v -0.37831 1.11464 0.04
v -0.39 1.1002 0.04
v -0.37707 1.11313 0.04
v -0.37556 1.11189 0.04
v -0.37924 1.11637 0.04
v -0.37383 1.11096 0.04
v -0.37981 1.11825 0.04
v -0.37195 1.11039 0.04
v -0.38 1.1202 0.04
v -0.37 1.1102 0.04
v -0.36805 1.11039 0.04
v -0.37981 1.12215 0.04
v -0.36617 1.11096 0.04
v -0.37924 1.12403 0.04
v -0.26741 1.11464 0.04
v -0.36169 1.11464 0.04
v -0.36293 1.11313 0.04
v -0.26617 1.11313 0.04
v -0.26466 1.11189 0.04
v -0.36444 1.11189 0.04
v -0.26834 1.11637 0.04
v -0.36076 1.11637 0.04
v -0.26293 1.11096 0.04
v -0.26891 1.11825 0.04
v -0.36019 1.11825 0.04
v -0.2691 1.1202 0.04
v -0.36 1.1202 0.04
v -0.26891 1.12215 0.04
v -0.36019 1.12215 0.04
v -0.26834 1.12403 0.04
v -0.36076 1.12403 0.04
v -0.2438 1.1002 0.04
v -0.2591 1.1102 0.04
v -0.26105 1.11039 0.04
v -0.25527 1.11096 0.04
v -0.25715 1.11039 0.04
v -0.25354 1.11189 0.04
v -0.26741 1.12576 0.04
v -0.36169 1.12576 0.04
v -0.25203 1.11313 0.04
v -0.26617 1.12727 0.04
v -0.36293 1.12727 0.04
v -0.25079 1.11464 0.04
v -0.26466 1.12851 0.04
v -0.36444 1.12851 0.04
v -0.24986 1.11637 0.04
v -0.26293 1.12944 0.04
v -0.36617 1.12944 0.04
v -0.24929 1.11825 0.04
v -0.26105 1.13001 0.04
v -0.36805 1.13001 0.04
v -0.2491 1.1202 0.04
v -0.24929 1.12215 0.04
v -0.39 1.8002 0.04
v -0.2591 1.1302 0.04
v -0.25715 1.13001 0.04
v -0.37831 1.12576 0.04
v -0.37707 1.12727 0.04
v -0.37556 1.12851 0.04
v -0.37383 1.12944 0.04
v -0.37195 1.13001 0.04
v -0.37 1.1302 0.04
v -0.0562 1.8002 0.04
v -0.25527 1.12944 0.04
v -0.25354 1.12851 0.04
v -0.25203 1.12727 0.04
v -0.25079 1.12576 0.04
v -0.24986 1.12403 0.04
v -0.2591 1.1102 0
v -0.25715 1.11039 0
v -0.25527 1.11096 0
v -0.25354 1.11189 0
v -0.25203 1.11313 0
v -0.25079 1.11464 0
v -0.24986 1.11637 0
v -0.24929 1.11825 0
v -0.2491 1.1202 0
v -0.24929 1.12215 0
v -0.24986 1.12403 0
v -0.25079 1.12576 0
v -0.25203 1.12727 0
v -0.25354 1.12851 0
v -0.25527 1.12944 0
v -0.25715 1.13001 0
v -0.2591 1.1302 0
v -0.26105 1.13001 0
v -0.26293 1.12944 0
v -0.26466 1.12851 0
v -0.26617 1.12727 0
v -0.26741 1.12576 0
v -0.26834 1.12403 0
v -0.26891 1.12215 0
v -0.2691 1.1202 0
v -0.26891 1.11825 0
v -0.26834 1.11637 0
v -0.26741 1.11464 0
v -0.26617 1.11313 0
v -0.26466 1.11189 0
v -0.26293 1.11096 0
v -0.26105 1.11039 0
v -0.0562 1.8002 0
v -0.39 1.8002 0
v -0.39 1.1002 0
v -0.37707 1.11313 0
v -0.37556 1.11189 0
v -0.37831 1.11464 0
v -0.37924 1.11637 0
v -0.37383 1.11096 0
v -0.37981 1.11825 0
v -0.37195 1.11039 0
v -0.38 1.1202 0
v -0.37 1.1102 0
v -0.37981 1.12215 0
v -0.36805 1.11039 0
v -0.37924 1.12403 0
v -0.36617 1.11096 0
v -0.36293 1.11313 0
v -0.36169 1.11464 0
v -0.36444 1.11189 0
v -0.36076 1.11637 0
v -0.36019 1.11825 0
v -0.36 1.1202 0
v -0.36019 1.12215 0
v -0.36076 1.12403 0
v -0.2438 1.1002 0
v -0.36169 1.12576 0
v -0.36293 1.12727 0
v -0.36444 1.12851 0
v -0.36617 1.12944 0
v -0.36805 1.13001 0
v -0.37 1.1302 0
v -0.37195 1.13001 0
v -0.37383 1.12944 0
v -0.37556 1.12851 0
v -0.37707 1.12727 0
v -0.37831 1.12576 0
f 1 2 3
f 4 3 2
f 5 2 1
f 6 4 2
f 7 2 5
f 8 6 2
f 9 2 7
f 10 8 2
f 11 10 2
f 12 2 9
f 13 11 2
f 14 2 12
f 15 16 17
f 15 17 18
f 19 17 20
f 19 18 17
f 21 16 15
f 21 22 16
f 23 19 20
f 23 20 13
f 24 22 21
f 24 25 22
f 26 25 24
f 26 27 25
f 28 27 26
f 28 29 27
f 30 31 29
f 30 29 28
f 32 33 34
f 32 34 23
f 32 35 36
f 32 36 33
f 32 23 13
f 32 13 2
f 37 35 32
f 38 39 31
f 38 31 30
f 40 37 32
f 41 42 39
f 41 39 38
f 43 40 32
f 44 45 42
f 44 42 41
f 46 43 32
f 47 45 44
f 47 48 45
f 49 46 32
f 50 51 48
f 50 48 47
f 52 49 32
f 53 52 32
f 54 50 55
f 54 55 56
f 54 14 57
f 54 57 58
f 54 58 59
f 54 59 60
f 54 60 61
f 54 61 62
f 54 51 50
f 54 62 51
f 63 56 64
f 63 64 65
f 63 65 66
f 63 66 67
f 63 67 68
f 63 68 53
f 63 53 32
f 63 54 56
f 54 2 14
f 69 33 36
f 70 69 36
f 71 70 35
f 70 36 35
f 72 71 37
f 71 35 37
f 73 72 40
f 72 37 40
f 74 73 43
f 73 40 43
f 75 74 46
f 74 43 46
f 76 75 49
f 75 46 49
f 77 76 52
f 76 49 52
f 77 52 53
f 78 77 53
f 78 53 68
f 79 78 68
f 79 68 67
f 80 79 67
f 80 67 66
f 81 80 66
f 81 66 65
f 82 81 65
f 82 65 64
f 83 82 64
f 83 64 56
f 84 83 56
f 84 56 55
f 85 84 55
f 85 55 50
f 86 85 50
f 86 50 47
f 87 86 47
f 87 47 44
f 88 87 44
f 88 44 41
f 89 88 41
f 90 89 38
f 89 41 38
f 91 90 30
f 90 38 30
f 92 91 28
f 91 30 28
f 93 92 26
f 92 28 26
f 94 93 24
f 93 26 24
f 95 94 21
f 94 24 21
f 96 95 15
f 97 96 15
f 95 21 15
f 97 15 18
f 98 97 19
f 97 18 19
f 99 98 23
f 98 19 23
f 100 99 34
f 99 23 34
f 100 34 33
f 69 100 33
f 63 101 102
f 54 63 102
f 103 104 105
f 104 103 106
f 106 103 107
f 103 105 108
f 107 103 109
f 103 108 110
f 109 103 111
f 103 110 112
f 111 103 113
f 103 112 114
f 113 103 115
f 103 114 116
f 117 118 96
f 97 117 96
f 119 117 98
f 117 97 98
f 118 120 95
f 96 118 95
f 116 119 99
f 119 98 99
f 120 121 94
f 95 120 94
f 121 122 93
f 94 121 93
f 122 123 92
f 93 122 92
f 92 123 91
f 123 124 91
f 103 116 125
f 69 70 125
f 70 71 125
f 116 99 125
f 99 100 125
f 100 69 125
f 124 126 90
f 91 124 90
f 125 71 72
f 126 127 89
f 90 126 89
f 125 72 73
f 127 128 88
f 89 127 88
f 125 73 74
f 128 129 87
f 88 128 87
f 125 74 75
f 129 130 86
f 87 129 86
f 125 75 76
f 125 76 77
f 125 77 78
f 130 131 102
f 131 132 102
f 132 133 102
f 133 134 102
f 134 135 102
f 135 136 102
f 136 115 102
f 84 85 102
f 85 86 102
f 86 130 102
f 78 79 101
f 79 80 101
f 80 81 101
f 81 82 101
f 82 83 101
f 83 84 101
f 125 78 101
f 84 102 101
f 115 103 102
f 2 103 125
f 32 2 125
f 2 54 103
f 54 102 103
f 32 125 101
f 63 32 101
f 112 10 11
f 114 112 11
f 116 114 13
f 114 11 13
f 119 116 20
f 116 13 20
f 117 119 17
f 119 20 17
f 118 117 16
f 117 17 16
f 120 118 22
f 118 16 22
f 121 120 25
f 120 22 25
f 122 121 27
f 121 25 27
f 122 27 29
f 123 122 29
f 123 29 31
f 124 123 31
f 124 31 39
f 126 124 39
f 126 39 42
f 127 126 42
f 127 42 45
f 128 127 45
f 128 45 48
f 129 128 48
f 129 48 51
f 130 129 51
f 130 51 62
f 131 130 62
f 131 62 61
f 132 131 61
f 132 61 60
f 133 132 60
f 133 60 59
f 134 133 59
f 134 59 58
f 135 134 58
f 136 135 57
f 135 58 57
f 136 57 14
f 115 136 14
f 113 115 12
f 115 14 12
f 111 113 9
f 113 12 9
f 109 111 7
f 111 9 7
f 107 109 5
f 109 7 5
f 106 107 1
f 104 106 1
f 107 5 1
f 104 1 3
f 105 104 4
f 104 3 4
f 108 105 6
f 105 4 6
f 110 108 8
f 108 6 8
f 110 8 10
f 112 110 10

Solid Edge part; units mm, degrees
sketch "Sketch1" plane through (0, 0, 0) normal (0, 0, 1) x (1, 0, 0)
  line L0 (-0.2438, 1.1002) -> (-0.0562, 1.8002)
  line L1 (-0.0562, 1.8002) -> (-0.39, 1.8002)
  line L2 (-0.39, 1.8002) -> (-0.39, 1.1002)
  line L3 (-0.39, 1.1002) -> (-0.2438, 1.1002)
extrude "Protrusion1" add sketch "Sketch1" along normal blind 0.04
hole "Bohrung_7" at (-0.37, 1.1202, 0.04) direction (0, 0, -1) diameter 0.02 end through all
hole "Hole1" at (-0.2591, 1.1202, 0.04) direction (0, 0, -1) diameter 0.02 end through all
